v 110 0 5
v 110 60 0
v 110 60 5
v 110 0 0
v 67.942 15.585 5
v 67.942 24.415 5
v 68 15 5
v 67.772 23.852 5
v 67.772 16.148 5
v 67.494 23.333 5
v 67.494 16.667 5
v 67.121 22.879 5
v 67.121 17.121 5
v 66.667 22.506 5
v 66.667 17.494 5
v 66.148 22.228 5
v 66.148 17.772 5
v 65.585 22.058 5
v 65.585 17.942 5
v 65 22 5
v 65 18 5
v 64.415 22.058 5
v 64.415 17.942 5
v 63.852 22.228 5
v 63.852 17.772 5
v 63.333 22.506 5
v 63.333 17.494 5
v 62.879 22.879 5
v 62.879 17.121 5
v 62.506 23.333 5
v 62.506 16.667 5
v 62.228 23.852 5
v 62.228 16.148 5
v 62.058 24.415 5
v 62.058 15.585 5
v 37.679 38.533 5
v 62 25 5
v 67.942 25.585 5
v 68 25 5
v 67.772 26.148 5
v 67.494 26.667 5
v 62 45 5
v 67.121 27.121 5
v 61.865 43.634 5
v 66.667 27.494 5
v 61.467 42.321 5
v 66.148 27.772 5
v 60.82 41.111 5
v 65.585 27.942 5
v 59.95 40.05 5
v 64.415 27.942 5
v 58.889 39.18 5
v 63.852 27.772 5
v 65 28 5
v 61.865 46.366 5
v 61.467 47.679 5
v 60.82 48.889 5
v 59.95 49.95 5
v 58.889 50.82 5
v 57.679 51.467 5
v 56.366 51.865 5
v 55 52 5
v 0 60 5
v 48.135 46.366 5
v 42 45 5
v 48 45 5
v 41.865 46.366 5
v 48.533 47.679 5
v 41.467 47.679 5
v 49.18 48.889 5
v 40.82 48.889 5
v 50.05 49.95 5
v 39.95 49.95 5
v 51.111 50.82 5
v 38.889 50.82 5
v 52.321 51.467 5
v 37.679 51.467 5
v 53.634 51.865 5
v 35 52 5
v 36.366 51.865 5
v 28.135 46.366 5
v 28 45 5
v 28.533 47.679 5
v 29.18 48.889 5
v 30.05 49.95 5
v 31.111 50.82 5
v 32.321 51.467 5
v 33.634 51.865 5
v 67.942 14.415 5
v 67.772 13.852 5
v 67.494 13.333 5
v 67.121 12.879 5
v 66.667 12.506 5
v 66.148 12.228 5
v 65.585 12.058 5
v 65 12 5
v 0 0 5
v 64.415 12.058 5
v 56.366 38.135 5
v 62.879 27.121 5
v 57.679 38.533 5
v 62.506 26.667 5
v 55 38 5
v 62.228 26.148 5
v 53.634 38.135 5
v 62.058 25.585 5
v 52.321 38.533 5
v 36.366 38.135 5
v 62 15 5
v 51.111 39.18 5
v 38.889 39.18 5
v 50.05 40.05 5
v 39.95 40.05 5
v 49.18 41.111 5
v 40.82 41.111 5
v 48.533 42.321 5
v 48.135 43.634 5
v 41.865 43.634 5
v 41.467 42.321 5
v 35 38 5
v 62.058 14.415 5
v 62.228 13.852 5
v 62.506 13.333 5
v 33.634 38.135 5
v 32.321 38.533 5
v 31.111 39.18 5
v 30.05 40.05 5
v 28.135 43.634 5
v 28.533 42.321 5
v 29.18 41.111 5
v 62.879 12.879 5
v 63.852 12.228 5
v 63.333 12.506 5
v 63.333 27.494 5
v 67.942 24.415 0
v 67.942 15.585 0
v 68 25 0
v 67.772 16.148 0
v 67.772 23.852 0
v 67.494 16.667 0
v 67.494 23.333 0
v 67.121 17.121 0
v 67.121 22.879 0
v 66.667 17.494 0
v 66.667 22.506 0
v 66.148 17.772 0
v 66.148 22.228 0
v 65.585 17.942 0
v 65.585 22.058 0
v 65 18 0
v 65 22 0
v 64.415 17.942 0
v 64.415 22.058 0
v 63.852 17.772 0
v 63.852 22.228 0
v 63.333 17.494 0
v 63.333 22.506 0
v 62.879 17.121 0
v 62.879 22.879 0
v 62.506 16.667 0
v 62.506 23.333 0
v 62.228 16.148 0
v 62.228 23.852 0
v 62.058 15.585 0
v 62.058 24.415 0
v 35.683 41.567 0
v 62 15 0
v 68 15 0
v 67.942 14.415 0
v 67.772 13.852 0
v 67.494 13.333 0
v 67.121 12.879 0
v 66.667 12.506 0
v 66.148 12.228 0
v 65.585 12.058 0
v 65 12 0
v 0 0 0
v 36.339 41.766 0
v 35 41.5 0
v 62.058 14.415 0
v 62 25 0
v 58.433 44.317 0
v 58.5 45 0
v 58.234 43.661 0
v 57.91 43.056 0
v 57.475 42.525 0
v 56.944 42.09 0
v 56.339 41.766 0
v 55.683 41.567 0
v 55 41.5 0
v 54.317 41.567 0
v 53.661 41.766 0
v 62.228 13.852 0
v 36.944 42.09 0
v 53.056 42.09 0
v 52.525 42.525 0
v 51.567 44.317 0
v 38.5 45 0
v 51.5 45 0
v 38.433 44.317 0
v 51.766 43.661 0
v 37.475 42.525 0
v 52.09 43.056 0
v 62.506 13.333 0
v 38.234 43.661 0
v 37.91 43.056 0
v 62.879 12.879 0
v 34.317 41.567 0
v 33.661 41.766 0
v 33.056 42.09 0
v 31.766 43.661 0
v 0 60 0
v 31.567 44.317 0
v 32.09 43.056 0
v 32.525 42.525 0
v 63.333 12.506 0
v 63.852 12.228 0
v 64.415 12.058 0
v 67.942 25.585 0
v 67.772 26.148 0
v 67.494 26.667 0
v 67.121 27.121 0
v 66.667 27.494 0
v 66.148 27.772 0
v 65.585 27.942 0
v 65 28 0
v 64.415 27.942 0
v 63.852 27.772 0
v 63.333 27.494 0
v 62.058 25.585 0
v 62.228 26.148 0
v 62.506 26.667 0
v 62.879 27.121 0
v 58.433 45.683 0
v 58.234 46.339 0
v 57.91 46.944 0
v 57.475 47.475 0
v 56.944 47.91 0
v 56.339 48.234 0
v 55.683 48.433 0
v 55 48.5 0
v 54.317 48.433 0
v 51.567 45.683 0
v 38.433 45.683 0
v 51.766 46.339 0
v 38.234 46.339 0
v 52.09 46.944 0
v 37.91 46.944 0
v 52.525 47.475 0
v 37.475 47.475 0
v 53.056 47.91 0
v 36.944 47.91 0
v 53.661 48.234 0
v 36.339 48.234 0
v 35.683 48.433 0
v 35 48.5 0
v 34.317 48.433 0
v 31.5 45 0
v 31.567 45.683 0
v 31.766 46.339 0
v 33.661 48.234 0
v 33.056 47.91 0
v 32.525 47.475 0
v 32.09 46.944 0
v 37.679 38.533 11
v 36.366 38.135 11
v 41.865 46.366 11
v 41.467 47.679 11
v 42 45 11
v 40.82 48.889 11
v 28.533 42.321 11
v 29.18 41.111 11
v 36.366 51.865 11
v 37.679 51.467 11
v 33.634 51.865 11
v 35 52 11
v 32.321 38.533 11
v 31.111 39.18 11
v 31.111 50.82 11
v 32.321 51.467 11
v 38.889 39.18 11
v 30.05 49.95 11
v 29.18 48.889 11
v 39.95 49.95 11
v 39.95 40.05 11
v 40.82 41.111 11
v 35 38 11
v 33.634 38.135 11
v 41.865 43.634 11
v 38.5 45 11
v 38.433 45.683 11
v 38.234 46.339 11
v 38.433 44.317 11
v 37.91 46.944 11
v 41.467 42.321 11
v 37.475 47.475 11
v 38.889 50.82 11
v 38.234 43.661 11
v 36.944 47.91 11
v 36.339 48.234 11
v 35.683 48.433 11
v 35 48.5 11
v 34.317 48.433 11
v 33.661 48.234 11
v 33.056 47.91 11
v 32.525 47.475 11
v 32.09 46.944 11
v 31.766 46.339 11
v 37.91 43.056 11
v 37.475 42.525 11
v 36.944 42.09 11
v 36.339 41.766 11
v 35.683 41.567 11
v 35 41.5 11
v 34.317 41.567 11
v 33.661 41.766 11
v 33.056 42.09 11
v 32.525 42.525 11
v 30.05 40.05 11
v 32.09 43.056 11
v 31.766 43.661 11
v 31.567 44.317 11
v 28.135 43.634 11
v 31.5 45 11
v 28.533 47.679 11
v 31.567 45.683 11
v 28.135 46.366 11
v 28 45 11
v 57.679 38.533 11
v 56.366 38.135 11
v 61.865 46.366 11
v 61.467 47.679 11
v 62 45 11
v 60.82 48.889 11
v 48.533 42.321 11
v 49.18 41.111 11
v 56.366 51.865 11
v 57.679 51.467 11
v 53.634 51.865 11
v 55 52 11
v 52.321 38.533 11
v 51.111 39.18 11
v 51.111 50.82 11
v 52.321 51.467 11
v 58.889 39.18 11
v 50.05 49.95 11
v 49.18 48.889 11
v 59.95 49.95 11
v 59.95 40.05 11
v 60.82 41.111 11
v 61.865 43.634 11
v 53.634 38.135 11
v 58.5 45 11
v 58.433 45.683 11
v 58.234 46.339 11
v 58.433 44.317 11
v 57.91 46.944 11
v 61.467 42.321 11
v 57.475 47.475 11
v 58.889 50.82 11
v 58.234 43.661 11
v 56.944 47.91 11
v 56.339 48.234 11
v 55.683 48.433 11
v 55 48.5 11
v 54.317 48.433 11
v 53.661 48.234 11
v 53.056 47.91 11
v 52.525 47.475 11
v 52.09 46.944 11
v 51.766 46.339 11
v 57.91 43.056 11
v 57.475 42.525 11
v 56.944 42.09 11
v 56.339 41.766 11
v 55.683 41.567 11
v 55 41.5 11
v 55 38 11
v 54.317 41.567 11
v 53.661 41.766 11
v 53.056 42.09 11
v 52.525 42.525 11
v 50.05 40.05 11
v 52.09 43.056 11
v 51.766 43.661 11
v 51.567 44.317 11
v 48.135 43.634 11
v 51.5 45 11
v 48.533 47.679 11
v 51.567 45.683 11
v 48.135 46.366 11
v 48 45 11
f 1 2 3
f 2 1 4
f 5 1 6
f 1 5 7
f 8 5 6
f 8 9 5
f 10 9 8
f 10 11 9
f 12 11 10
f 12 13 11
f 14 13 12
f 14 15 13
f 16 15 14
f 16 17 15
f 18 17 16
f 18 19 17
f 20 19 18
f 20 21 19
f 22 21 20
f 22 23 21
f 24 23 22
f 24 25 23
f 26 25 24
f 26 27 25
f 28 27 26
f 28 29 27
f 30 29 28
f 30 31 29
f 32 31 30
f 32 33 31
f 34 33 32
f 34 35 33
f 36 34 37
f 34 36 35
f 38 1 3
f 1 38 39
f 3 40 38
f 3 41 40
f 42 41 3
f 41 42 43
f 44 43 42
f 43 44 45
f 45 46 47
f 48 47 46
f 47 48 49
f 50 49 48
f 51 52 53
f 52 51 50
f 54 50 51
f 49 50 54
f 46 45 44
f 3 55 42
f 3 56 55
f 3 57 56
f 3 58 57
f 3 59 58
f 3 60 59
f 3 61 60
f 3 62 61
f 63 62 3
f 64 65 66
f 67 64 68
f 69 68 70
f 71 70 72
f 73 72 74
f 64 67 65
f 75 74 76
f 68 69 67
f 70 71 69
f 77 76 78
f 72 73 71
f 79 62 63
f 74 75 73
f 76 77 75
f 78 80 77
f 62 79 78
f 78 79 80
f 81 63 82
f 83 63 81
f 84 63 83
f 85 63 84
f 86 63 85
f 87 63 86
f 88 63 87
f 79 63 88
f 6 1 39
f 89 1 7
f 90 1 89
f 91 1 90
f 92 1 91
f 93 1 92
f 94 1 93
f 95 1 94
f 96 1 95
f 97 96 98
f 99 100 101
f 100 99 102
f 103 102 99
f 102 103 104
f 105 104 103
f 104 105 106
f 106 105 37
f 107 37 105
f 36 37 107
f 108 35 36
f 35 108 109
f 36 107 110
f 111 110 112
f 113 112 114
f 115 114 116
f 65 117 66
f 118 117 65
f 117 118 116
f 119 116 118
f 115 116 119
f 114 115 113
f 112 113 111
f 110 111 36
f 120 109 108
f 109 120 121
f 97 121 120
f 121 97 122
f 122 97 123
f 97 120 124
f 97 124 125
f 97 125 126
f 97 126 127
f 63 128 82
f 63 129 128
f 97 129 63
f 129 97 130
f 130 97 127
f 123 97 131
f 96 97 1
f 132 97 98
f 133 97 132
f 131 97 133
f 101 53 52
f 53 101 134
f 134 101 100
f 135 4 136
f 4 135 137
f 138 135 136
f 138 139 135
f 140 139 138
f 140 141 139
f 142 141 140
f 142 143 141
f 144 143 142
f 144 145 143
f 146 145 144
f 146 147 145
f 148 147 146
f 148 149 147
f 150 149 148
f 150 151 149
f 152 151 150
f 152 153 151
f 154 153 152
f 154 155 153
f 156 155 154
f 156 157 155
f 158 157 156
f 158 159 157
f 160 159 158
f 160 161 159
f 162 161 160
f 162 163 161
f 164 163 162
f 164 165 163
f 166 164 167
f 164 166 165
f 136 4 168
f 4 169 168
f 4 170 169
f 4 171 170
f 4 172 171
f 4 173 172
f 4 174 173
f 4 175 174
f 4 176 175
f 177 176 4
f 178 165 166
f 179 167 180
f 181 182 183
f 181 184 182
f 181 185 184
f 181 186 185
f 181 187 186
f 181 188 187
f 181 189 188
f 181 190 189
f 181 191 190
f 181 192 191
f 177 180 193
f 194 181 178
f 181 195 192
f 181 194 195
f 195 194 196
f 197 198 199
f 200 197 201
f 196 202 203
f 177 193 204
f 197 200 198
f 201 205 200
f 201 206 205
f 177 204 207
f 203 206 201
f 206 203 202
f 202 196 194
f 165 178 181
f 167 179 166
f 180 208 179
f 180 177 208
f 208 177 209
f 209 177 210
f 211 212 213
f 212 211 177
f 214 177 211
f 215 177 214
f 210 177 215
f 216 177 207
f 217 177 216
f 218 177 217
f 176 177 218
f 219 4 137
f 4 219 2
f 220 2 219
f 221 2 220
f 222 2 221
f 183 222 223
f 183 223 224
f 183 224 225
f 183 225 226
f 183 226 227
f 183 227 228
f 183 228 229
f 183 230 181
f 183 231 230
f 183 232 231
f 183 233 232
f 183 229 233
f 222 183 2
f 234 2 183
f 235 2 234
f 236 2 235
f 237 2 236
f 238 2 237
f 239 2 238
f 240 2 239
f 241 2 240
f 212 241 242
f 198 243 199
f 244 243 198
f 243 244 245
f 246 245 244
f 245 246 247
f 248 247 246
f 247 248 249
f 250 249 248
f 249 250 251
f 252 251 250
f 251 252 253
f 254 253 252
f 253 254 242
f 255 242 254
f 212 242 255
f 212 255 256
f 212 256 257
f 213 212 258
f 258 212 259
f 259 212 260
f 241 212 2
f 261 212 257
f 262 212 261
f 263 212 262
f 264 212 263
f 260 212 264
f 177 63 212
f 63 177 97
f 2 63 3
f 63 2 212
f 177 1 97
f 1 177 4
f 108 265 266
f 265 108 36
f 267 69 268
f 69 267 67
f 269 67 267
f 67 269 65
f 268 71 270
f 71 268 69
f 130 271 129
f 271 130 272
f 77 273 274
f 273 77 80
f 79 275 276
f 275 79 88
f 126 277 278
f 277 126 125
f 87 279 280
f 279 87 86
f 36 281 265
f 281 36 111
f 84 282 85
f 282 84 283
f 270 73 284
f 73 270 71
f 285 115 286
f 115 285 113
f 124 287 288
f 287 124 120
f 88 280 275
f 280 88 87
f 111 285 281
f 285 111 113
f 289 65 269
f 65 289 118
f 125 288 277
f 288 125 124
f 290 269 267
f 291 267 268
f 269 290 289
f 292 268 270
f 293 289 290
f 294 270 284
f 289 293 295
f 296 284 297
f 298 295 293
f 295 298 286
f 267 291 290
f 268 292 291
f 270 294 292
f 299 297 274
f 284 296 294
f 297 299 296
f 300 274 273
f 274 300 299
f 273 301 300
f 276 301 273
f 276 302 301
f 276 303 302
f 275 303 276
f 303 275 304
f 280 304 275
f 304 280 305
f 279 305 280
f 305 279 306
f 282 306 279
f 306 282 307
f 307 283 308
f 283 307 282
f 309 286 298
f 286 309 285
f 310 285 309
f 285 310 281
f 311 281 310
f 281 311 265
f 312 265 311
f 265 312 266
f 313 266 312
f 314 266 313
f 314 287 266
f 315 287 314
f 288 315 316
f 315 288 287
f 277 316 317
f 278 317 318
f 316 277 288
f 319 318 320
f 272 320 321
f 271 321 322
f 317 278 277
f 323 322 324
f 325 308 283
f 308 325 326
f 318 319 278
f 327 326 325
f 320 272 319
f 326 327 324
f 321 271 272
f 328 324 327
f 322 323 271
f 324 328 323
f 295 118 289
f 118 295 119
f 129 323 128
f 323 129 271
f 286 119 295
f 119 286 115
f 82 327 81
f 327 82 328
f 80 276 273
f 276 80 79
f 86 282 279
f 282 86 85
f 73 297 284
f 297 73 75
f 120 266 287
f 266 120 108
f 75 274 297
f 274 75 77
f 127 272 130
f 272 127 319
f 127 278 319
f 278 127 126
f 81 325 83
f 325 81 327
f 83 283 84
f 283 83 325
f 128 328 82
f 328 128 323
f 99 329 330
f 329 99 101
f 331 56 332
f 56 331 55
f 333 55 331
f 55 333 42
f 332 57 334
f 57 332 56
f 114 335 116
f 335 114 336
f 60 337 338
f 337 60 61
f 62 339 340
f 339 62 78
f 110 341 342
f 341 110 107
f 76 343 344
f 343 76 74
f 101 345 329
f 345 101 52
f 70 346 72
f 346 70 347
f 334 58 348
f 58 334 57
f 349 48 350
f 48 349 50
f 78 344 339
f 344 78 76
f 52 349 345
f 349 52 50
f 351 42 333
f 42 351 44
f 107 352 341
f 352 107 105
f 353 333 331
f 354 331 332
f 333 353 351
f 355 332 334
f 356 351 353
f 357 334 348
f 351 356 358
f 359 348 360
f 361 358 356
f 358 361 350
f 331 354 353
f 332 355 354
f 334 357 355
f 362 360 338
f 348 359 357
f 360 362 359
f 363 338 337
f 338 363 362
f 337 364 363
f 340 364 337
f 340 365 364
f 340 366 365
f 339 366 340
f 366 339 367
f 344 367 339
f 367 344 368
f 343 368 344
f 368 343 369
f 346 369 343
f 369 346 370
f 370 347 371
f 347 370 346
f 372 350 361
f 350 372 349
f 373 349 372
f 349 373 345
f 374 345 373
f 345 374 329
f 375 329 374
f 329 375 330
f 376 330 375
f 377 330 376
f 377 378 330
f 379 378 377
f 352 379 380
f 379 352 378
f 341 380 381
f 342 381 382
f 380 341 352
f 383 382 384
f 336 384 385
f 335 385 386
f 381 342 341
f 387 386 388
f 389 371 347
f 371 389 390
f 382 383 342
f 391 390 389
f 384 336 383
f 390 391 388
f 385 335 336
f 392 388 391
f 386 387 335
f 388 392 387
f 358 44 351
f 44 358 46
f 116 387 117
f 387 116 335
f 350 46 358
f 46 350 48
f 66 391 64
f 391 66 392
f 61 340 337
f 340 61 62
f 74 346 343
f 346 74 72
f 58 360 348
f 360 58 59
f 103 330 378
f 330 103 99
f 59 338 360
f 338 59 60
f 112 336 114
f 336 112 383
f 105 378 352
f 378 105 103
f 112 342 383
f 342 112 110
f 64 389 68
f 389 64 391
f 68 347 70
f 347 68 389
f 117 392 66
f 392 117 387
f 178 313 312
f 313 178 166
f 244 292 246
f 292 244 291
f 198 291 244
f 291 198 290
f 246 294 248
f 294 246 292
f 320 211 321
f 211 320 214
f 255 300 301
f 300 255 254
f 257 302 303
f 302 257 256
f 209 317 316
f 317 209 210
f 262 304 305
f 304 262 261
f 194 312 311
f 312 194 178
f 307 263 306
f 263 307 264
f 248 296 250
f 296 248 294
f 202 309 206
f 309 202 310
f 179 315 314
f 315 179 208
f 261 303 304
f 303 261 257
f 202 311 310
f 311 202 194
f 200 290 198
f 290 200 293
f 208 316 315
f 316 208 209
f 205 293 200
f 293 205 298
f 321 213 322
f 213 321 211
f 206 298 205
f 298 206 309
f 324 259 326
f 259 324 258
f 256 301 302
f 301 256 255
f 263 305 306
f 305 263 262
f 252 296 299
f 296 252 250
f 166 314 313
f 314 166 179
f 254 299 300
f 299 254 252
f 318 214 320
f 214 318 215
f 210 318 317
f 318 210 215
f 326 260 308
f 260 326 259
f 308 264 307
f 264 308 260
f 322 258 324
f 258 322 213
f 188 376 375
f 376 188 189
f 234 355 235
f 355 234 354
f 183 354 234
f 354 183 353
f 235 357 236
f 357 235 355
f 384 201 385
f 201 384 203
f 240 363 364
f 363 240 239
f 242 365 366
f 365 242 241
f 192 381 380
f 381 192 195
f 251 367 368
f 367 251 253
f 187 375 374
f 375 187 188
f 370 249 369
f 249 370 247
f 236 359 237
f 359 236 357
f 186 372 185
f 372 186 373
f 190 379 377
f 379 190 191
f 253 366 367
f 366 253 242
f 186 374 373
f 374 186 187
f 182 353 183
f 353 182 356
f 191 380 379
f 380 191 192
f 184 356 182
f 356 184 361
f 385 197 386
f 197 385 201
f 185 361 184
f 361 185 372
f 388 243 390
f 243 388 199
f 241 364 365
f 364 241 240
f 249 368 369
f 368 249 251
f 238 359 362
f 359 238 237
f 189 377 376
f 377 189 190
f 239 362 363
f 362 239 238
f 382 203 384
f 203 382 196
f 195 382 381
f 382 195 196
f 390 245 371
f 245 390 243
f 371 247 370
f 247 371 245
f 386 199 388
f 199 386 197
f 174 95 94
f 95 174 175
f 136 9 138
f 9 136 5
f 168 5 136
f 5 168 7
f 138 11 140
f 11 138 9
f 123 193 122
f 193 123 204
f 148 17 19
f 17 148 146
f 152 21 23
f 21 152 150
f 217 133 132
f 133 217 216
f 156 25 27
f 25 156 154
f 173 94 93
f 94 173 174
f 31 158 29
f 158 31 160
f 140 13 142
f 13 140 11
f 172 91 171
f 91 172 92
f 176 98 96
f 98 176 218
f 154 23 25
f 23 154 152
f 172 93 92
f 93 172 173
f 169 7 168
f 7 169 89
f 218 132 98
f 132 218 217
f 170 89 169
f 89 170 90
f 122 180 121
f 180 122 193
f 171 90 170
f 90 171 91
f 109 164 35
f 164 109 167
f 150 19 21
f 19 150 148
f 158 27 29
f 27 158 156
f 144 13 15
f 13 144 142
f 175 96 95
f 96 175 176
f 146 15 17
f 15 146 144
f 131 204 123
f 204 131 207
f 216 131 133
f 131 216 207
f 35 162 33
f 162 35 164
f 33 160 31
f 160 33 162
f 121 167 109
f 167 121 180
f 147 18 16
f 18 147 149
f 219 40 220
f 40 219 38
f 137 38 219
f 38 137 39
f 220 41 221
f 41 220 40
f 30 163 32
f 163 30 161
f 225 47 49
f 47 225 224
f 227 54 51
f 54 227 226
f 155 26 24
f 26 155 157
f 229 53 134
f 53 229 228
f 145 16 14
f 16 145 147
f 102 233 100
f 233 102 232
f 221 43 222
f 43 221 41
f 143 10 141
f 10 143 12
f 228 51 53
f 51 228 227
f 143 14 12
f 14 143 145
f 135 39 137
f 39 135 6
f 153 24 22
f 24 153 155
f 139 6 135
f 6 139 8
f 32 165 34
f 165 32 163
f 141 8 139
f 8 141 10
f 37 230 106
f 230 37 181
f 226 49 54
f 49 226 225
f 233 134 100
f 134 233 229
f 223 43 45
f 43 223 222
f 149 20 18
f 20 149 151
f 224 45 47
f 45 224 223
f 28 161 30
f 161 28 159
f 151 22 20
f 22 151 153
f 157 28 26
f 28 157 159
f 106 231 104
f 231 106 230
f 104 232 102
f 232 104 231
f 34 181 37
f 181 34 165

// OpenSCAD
$fn = 32;

// ----------------------------------------------------------------------
// Mixed field: bosses and holes at given coordinates
// ----------------------------------------------------------------------

// --- parameters (mm) ---
plate_l = 110;            // plate length, X
plate_w = 60;             // plate width, Y
plate_t = 5;              // plate thickness, Z
boss_d = 14;              // boss diameter
boss_h = 6;               // boss height above the plate
hole_d = 6;               // through hole diameter

total_h = plate_t + boss_h;  // overall height

difference() {
  union() {
    cube([plate_l, plate_w, plate_t]);
    translate([35, 45, plate_t]) cylinder(h = boss_h, d = boss_d);
    translate([55, 45, plate_t]) cylinder(h = boss_h, d = boss_d);
  }
  translate([35, 45, -1]) cylinder(h = total_h + 2, d = boss_d / 2);
  translate([55, 45, -1]) cylinder(h = total_h + 2, d = boss_d / 2);
  translate([65, 15, -1]) cylinder(h = plate_t + 2, d = hole_d);
  translate([65, 25, -1]) cylinder(h = plate_t + 2, d = hole_d);
}
